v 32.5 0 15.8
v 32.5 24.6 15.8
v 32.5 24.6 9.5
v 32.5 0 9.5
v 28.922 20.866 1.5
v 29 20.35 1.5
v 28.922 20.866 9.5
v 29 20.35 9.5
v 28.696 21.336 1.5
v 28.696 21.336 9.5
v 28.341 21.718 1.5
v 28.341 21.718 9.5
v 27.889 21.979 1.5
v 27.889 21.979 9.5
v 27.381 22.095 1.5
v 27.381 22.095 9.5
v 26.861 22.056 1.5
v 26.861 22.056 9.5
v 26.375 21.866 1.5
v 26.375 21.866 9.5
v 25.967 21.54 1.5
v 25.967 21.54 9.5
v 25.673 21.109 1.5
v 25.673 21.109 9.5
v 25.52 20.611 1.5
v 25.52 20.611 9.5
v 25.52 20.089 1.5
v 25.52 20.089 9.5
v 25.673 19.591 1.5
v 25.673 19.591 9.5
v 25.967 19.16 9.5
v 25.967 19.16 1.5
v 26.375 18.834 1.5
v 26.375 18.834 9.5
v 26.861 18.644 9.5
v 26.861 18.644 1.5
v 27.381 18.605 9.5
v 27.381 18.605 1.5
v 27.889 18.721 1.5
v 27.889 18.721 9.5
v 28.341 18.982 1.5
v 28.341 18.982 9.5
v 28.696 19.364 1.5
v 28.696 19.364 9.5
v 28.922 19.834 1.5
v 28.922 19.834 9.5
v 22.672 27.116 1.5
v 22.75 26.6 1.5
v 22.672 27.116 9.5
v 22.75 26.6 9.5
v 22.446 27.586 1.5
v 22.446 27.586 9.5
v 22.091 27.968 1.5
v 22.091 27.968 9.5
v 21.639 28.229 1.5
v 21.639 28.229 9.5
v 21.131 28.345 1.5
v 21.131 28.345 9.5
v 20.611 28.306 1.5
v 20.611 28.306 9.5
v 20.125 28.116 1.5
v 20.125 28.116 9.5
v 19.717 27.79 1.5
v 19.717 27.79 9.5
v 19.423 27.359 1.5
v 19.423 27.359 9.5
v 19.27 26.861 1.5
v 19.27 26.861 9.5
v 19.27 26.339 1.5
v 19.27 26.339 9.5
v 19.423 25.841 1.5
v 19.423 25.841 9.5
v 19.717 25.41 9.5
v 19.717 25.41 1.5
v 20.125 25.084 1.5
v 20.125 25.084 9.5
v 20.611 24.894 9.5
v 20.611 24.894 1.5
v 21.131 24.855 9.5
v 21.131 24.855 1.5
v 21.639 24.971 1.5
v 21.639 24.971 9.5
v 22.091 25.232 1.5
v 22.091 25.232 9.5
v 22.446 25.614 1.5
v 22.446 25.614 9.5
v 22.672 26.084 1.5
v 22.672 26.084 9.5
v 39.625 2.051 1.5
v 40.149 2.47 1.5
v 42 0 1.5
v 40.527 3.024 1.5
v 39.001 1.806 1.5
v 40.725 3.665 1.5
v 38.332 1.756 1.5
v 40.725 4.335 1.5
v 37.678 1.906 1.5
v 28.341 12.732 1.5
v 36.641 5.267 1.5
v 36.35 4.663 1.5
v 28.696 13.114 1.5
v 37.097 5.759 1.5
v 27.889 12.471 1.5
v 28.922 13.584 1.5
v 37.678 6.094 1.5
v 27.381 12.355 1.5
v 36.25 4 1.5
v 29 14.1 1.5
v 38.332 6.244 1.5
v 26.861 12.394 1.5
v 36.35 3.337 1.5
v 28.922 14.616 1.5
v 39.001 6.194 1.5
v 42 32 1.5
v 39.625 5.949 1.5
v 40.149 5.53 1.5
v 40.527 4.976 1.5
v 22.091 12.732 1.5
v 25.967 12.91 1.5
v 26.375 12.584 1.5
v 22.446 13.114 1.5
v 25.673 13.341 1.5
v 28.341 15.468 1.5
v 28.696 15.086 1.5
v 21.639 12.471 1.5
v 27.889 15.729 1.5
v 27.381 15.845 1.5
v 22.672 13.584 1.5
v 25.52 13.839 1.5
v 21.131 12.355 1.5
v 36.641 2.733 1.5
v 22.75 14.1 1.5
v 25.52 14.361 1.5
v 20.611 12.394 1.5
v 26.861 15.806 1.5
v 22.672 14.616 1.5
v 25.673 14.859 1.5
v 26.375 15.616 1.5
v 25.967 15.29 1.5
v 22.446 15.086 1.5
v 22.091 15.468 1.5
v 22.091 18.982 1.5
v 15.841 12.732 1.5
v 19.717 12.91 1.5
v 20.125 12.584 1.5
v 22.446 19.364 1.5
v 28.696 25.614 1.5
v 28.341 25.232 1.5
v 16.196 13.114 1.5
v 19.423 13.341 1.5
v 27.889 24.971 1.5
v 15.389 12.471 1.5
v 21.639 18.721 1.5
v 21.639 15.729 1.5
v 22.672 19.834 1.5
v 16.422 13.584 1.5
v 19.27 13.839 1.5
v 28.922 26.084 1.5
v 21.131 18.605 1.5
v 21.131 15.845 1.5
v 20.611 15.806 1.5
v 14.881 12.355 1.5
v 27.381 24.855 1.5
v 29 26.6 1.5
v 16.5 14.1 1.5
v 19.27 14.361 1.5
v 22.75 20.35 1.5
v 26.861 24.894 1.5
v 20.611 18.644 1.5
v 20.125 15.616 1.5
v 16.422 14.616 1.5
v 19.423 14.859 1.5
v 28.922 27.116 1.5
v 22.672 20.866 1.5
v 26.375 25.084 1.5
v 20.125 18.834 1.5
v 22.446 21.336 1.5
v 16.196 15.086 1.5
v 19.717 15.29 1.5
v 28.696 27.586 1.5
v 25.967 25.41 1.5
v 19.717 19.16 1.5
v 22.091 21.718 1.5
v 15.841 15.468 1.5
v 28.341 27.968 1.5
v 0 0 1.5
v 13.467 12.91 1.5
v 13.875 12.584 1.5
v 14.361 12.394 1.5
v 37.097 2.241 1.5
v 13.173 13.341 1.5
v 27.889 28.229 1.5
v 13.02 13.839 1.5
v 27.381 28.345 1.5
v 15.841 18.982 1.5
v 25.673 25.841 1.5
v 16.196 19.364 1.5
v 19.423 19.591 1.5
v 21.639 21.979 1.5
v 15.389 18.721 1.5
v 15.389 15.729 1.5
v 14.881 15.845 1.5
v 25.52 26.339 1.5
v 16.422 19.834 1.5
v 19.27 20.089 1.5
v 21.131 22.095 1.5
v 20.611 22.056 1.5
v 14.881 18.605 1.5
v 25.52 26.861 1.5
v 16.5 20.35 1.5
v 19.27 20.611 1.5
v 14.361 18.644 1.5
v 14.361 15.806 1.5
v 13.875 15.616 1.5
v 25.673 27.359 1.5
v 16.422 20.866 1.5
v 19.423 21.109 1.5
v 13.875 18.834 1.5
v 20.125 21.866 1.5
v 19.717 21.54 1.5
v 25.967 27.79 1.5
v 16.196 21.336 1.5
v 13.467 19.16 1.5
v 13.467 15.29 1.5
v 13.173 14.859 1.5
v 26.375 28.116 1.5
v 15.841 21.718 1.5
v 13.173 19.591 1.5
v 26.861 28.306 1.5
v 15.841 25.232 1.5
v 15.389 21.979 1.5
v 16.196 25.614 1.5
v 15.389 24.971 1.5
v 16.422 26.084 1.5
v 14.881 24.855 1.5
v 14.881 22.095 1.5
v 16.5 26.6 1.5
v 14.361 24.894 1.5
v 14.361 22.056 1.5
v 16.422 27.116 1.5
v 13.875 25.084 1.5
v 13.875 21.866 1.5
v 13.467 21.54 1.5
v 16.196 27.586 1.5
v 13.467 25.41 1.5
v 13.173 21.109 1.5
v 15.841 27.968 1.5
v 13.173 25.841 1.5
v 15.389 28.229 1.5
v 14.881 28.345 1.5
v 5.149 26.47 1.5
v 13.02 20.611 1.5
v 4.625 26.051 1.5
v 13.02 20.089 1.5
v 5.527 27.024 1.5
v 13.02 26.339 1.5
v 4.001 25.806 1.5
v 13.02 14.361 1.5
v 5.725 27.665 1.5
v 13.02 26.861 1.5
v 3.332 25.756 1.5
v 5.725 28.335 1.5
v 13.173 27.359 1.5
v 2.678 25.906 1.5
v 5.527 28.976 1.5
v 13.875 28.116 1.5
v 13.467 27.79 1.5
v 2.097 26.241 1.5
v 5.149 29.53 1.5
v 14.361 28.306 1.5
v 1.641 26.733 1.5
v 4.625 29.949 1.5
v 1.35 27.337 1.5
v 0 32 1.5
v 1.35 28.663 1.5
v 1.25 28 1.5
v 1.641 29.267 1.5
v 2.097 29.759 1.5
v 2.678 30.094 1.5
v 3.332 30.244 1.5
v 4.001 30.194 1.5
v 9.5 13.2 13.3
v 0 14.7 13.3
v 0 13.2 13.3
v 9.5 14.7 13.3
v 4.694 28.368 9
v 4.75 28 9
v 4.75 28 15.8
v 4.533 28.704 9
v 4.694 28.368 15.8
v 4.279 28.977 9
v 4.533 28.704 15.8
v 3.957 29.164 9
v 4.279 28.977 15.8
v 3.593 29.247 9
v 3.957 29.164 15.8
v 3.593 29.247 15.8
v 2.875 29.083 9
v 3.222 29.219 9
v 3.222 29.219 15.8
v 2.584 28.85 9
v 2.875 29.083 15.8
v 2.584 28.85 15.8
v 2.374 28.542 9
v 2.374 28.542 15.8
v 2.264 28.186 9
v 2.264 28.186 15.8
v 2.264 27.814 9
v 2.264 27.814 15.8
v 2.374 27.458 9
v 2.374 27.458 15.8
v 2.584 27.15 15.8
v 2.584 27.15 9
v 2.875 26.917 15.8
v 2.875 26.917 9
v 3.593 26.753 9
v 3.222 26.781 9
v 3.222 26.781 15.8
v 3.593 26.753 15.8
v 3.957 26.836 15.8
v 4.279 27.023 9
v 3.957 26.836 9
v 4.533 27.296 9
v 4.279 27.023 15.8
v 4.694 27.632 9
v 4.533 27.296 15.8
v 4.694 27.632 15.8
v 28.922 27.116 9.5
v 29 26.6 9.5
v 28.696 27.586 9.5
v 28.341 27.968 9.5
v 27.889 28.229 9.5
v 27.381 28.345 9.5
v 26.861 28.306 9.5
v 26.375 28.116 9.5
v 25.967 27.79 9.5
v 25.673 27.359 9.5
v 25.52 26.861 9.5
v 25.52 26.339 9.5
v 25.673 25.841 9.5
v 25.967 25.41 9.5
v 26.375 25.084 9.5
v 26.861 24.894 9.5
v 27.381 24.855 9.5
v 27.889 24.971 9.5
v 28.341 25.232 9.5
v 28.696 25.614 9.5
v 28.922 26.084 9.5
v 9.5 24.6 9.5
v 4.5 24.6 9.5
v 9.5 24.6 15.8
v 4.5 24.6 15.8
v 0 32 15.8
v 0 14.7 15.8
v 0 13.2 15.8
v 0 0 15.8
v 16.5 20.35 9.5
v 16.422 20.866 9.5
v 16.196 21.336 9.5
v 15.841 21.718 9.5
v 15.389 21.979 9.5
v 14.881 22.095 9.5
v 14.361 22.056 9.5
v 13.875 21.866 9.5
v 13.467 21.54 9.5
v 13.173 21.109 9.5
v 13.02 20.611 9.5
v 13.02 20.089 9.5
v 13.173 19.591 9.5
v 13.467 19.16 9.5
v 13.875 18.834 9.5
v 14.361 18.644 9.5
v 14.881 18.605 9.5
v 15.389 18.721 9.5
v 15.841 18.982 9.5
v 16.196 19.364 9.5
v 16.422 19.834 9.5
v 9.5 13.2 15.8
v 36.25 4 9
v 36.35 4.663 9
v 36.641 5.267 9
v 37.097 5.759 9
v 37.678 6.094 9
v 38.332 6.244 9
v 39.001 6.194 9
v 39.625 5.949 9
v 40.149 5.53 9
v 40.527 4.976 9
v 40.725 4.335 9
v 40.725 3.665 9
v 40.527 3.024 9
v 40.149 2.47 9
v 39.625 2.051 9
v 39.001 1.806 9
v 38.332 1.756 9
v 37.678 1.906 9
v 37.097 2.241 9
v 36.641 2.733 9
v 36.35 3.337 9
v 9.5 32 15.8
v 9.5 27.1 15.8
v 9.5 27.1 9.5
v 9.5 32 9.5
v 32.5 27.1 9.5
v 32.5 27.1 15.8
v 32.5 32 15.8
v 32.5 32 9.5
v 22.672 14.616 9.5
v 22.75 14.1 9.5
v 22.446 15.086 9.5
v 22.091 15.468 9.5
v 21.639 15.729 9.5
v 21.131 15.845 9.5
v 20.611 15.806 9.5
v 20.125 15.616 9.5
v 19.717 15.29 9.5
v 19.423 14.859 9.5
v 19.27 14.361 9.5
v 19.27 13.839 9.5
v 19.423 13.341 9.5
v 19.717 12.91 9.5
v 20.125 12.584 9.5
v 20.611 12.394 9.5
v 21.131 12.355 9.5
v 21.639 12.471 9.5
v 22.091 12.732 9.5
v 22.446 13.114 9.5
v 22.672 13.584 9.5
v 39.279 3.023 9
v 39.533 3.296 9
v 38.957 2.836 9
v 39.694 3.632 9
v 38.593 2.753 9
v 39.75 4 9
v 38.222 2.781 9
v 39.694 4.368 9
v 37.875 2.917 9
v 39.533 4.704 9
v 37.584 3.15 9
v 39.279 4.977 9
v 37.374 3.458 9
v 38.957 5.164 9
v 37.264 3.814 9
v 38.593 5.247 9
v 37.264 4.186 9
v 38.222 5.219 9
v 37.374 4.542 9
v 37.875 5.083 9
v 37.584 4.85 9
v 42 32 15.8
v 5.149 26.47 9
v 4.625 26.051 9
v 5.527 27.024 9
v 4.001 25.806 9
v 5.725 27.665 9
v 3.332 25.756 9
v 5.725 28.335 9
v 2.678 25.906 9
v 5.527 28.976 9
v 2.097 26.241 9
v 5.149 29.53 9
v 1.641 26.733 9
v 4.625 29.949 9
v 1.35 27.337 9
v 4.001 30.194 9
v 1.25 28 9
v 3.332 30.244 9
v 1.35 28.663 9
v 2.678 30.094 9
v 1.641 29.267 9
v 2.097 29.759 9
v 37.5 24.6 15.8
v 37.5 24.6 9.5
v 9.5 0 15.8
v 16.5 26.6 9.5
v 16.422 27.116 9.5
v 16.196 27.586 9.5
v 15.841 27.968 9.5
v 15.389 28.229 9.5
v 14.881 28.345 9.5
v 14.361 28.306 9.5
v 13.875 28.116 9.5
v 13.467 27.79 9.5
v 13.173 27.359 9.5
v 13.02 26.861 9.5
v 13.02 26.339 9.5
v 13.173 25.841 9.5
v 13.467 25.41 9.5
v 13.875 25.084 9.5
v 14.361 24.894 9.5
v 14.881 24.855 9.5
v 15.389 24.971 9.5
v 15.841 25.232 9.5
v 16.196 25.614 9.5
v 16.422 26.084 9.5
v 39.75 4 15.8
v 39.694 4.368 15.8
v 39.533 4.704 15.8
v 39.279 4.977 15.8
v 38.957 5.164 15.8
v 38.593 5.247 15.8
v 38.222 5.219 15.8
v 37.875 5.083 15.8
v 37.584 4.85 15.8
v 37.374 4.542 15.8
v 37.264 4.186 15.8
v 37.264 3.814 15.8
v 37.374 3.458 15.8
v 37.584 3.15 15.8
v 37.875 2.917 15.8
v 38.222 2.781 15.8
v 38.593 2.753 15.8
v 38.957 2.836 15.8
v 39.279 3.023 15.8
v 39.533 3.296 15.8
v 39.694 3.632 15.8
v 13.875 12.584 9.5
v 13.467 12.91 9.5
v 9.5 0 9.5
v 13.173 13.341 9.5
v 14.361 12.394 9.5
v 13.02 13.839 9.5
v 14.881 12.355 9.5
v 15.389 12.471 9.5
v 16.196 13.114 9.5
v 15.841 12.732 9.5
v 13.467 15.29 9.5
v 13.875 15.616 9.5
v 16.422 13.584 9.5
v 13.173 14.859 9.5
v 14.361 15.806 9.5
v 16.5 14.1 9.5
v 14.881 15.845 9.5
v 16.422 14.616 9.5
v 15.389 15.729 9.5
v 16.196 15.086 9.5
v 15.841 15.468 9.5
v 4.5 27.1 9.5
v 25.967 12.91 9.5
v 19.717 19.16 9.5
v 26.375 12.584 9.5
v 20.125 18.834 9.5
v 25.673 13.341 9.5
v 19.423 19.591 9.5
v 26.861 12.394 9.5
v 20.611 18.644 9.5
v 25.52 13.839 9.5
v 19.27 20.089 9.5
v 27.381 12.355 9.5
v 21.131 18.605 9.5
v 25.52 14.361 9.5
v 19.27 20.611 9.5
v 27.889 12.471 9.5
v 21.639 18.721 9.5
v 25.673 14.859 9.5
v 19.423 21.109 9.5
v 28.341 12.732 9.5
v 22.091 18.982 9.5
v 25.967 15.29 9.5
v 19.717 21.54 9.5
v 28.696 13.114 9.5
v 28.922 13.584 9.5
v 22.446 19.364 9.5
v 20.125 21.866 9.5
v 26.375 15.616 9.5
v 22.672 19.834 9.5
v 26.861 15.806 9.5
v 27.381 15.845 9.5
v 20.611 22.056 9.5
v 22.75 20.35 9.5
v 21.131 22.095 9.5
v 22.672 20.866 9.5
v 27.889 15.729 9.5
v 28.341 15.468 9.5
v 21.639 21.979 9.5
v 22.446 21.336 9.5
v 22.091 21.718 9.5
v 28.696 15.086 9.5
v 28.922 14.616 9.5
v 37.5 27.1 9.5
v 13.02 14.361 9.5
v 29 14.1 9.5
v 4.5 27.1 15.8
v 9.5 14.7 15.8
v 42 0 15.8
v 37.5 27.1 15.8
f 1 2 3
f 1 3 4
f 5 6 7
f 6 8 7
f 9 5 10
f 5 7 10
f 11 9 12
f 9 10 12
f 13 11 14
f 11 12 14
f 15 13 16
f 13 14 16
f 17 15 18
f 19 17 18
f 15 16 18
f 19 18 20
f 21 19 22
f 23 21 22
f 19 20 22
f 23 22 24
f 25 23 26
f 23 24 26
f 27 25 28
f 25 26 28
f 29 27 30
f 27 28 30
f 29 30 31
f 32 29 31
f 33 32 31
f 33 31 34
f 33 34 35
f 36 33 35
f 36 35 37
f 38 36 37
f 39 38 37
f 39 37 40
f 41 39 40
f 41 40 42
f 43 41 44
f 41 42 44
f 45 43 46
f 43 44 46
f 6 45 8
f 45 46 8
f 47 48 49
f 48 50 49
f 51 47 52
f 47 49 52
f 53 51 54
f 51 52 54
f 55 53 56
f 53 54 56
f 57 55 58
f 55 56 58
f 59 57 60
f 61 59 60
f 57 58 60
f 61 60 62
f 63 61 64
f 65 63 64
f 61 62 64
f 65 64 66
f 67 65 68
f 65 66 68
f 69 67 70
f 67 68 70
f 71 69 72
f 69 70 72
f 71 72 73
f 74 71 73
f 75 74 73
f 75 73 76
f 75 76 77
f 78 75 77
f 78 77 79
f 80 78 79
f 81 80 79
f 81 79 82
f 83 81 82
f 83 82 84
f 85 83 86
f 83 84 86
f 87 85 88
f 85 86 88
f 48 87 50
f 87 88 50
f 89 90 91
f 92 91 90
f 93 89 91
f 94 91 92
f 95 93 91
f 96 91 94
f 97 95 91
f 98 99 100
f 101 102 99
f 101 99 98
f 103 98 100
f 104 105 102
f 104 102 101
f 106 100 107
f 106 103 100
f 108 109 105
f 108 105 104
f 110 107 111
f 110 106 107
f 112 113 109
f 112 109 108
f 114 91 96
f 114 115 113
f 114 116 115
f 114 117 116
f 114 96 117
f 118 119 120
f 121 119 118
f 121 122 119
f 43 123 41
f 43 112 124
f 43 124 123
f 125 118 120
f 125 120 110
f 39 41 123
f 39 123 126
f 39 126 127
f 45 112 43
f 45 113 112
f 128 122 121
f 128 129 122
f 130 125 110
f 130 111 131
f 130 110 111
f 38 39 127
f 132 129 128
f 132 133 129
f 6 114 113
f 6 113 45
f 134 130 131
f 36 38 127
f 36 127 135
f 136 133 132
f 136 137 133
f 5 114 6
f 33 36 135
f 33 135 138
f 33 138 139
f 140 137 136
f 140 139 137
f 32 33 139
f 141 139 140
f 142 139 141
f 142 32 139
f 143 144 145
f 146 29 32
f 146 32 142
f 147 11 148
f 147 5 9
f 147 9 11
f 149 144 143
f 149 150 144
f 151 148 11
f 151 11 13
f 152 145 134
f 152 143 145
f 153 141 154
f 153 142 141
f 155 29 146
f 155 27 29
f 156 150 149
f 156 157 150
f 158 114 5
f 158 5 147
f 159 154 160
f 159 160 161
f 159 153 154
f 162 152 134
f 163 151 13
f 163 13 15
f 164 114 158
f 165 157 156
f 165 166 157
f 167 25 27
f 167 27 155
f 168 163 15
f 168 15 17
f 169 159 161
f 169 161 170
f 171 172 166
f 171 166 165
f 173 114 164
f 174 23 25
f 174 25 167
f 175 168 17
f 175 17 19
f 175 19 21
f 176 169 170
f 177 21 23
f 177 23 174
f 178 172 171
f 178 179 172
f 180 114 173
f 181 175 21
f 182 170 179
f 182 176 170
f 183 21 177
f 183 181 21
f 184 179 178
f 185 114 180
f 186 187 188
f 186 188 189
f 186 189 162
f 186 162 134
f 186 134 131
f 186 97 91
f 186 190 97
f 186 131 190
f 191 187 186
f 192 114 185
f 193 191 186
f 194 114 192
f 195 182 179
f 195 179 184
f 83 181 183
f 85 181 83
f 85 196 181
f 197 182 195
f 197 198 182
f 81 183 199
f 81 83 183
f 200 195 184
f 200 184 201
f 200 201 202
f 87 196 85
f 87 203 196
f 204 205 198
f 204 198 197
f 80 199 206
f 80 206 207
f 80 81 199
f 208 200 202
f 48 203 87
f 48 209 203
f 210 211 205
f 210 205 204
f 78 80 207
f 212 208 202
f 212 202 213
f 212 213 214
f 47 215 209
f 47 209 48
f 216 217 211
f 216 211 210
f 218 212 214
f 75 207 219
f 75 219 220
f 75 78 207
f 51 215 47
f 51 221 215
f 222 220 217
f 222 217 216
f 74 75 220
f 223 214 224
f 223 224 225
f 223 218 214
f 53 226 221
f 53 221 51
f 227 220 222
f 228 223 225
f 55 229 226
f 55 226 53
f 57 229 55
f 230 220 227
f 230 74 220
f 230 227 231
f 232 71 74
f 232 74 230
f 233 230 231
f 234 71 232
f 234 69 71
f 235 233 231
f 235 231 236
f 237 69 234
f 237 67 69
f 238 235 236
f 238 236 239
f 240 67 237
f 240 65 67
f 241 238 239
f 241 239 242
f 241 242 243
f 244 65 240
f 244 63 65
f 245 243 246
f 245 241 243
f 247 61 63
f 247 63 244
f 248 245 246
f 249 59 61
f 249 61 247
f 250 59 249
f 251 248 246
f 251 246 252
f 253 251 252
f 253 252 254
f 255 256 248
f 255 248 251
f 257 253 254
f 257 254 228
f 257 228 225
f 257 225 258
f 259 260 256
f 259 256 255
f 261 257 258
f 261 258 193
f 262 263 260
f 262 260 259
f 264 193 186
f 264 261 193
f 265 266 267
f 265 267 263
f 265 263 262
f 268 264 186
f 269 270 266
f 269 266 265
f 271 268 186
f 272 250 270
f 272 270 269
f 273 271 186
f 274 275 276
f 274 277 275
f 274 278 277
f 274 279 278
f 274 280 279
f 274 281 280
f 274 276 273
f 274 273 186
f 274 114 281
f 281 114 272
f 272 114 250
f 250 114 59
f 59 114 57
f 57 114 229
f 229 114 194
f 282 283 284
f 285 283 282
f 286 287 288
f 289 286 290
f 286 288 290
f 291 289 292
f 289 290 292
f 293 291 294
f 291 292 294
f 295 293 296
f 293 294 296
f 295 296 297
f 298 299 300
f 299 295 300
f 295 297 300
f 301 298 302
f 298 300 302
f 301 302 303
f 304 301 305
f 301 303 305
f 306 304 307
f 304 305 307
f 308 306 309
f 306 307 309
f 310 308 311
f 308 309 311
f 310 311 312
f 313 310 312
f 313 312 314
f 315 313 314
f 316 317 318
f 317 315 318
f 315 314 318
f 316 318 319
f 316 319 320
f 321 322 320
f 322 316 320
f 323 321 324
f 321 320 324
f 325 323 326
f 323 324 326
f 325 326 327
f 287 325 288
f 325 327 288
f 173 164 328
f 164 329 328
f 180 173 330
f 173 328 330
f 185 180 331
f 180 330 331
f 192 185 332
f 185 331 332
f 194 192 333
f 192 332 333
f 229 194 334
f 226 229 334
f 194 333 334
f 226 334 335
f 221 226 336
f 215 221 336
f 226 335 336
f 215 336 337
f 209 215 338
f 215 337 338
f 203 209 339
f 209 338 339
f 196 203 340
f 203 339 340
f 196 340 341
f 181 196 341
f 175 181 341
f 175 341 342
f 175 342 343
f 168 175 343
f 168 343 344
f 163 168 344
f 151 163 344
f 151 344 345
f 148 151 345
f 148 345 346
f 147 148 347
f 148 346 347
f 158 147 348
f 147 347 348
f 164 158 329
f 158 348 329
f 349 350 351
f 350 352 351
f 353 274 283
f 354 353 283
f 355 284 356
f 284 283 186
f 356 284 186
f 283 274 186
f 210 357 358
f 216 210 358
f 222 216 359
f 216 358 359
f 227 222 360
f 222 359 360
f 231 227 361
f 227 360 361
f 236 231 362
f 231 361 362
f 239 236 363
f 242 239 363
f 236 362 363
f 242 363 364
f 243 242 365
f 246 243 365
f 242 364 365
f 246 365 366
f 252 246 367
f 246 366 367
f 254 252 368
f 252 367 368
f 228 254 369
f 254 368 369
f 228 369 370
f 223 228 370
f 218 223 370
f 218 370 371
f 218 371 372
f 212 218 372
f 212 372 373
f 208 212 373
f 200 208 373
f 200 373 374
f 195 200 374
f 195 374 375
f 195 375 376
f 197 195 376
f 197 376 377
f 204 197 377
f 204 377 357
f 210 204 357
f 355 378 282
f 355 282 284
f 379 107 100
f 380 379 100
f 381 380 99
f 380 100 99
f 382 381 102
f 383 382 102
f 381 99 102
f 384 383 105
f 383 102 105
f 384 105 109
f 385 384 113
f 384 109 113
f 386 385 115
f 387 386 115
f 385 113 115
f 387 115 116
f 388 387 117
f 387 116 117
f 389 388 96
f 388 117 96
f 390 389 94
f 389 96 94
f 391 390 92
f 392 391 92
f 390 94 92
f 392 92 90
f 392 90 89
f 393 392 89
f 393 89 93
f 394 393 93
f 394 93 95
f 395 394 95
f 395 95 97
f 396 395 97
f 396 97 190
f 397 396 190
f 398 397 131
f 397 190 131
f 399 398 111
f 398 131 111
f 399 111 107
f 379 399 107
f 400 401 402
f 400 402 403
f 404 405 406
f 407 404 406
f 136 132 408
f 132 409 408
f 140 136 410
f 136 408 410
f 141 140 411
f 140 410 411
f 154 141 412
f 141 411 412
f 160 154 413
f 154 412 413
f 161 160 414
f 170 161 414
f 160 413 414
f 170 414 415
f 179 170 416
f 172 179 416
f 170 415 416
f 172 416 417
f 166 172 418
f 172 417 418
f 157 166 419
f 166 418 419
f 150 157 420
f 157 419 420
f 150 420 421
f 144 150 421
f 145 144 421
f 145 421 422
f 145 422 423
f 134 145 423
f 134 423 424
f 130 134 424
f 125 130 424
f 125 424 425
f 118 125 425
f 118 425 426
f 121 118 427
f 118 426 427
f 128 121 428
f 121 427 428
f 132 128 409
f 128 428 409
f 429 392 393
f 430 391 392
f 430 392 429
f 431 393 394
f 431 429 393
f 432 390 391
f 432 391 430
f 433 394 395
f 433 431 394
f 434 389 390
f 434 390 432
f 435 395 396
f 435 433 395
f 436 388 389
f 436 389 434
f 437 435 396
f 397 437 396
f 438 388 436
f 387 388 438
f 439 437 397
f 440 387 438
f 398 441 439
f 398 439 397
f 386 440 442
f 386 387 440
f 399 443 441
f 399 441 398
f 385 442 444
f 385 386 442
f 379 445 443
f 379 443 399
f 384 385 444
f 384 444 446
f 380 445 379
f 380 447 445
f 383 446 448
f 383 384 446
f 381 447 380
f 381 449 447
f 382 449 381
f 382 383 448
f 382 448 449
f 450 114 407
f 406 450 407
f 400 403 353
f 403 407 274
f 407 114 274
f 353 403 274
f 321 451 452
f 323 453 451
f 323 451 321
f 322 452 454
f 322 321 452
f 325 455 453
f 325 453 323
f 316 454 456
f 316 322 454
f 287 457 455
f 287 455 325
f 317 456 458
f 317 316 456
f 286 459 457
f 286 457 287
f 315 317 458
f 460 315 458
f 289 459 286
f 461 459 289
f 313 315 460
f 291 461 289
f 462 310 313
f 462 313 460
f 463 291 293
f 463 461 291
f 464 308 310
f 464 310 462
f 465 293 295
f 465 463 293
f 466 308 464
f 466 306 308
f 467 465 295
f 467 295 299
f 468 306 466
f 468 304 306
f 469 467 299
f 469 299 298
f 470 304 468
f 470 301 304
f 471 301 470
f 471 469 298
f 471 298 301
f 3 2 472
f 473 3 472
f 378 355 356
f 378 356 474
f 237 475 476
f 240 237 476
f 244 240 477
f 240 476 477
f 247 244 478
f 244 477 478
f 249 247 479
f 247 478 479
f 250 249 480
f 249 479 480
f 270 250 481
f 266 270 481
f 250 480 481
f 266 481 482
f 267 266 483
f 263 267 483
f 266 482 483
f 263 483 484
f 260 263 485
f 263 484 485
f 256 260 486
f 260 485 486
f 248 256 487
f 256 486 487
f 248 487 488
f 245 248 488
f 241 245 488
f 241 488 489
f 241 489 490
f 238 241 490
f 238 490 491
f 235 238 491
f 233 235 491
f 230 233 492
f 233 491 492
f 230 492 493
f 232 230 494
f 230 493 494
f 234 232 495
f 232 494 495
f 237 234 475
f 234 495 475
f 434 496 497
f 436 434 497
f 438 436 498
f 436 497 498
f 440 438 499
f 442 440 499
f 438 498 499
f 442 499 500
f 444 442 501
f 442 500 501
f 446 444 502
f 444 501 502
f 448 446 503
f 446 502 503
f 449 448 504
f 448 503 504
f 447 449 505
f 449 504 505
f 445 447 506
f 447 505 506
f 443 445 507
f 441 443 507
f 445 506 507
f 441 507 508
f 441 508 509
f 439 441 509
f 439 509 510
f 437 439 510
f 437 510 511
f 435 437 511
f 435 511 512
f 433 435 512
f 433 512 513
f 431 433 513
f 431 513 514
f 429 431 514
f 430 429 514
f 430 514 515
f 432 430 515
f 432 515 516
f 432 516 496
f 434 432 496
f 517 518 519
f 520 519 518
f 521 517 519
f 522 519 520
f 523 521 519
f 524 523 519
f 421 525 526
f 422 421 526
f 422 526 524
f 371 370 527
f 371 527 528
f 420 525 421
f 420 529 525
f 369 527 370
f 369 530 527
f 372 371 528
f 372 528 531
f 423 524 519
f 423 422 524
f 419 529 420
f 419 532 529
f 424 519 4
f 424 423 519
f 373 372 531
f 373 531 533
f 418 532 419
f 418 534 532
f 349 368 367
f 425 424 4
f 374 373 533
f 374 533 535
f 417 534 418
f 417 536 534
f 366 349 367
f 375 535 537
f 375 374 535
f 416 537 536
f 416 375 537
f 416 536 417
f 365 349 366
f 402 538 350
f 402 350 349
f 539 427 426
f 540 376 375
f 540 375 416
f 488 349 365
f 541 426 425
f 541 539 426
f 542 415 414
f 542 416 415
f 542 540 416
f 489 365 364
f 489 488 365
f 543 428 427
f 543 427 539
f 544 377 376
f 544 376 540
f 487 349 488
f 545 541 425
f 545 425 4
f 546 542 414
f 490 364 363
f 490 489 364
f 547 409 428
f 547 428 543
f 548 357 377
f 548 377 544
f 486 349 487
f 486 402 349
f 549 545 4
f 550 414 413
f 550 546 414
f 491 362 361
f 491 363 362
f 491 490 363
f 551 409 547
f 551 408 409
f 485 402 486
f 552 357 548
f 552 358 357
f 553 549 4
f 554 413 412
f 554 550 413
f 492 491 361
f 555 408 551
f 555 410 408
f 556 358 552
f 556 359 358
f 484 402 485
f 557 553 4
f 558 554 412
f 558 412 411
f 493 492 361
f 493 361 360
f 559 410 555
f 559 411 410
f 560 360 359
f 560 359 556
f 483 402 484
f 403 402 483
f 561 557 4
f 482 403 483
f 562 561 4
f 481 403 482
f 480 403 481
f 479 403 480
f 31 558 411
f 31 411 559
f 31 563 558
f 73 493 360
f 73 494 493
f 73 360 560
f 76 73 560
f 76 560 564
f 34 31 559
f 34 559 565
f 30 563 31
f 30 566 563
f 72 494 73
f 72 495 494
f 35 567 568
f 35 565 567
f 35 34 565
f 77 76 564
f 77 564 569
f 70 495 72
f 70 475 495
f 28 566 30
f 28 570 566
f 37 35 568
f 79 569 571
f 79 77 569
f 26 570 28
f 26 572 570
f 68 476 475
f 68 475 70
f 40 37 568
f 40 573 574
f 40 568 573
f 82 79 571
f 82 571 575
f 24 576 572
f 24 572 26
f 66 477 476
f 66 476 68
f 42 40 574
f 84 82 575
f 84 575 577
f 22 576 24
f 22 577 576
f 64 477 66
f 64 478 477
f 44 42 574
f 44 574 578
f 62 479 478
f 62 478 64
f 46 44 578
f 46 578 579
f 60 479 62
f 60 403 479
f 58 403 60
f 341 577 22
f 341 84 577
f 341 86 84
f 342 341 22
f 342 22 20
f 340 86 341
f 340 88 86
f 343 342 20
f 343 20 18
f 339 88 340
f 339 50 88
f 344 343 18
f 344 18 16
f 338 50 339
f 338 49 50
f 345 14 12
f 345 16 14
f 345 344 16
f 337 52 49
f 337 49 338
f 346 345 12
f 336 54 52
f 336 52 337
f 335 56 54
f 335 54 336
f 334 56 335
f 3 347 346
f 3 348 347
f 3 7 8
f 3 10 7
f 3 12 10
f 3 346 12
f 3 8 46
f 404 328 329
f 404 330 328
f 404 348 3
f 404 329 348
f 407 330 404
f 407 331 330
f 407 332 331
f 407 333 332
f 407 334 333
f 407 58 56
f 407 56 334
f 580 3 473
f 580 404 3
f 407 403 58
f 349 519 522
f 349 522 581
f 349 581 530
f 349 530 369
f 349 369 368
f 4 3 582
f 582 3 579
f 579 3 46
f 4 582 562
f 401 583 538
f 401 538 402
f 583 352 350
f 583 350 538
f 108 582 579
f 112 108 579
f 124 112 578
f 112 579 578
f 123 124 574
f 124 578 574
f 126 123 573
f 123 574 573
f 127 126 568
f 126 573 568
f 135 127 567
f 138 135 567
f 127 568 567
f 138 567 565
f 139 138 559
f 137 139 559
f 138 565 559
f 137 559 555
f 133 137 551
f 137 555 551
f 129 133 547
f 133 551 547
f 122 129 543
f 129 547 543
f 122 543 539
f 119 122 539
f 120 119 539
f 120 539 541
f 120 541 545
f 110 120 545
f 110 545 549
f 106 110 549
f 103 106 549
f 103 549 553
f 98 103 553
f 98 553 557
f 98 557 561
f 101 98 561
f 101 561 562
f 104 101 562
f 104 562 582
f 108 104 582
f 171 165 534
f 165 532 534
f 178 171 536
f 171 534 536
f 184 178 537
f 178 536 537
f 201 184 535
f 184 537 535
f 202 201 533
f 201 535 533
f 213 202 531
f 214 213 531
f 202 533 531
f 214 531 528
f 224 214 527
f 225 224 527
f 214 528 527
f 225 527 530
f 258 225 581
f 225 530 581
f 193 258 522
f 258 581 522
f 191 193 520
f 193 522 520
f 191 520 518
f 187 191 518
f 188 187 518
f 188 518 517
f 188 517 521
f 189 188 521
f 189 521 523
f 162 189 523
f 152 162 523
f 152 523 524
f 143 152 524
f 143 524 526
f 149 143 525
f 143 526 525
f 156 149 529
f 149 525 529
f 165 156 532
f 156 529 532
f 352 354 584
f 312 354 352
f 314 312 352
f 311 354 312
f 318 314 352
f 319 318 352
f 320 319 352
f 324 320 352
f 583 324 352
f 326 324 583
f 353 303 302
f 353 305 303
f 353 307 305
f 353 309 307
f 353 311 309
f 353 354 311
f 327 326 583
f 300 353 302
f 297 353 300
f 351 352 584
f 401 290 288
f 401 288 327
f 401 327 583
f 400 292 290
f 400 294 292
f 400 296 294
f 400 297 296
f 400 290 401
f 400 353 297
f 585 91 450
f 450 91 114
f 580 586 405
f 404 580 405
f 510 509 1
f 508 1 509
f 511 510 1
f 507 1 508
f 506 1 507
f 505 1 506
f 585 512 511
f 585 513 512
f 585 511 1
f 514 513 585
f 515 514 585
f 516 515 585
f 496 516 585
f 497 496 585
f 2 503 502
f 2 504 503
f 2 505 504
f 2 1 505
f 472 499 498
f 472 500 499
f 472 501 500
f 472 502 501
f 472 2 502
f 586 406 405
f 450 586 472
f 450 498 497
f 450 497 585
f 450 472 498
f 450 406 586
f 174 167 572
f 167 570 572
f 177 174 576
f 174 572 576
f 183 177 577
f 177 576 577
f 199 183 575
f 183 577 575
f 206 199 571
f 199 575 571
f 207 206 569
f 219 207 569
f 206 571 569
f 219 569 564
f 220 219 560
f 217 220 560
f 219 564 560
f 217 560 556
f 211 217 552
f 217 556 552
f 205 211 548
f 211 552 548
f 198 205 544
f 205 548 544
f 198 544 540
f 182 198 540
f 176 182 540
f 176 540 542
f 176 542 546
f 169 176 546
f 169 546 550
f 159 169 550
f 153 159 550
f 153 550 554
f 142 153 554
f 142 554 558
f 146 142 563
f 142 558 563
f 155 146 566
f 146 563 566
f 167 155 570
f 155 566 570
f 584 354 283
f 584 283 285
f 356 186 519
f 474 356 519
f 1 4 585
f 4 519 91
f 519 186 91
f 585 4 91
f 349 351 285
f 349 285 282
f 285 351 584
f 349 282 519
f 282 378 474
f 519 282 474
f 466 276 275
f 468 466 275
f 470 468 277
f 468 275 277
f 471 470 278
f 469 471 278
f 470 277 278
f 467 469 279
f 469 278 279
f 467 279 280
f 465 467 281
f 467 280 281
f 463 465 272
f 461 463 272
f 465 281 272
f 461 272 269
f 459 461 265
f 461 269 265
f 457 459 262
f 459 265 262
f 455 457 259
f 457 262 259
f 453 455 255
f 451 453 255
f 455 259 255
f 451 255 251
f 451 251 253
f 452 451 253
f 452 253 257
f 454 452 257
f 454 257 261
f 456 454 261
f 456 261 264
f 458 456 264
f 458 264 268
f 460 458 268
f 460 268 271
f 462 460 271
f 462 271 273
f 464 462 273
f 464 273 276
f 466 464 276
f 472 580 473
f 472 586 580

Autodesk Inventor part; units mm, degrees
ref_plane "YZ Plane" through (0, 0, 0) normal (1, 0, 0) x (0, 1, 0)
ref_plane "XZ Plane" through (0, 0, 0) normal (0, 1, 0) x (-1, 0, 0)
ref_plane "XY Plane" through (0, 0, 0) normal (0, 0, 1) x (1, 0, 0)
sketch "Sketch2" plane through (0, 0, 0) normal (0, 0, 1) x (1, 0, 0)
  line L0 (0, 0) -> (42, 0)
  line L1 (42, 0) -> (42, 32)
  line L2 (42, 32) -> (0, 32)
  line L3 (0, 32) -> (0, 0)
  dimension "d0" = 42
  dimension "d1" = 32
extrude "Cover_Body" add sketch "Sketch2" along normal blind 15.8
sketch "Sketch4" plane through (0, 0, 15.8) normal (0, 0, 1) x (1, 0, 0)
  line L0 (42, 32) -> (0, 32) projected
  line L1 (0, 32) -> (0, 0) projected
  line L2 (4.5, 24.6) -> (9.5, 24.6)
  line L3 (32.5, 24.6) -> (37.5, 24.6)
  line L4 (42, 0) -> (42, 32) projected
  line L5 (0, 0) -> (42, 0) projected
  line L6 (4.5, 24.6) -> (4.5, 27.1)
  line L7 (4.5, 27.1) -> (9.5, 27.1)
  line L8 (9.5, 27.1) -> (9.5, 32)
  line L9 (37.5, 27.1) -> (37.5, 24.6)
  line L10 (37.5, 27.1) -> (32.5, 27.1)
  line L11 (32.5, 27.1) -> (32.5, 32)
  line L12 (9.5, 32) -> (32.5, 32)
  line L13 (21, 36.5125) -> (21, -47.625) construction
  line L14 (32.5, 24.6) -> (32.5, 0)
  line L15 (9.5, 24.6) -> (9.5, 0)
  line L16 (9.5, 0) -> (32.5, 0)
  point P0 (4.9935, 32)
  point P1 (37, 32)
  dimension "d6" = 5
  dimension "d14" = 2.5
  dimension "d15" = 2.5
  dimension "d22" = 42
  dimension "d23" = 21
  dimension "d24" = 23
  dimension "d28" = 5
  dimension "d118" = 23
  dimension "d119" = 11.5
  dimension "d120" = 11.5
  dimension "d121" = 24.6
extrude "Servo_Opening" cut sketch "Sketch4" against normal blind 6.3 contours L11 L10 L9 L3 L14 L5 L15 L2 L6 L7 L8 L0
sketch "Sketch5" plane through (0, 0, 15.8) normal (0, 0, 1) x (1, 0, 0)
  line L0 (0, 32) -> (0, 0) projected
  line L1 (0, 13.2) -> (0, 14.7)
  line L2 (-29.647, 13.95) -> (54.8226, 13.95) construction
  line L3 (0, 0) -> (42, 0) projected
  line L4 (0, 14.7) -> (9.5, 14.7)
  line L5 (9.5, 14.7) -> (9.5, 13.2)
  line L6 (9.5, 13.2) -> (0, 13.2)
  line L7 (9.5, 0) -> (9.5, 24.6) projected
  line L8 (9.5, 32) -> (0, 32) projected
  dimension "d97" = 1.5
  dimension "d131" = 13.2
extrude "Cable_Opening" cut sketch "Sketch5" against normal blind 2.5 contours L4 L5 L6 L0
sketch "Sketch6" plane through (0, 0, 15.8) normal (0, 0, 1) x (1, 0, 0)
  circle A0 centre (3.5, 28) radius 1.25
  circle A1 centre (38.5, 28) radius 1.25 construction
  circle A2 centre (38.5, 4) radius 1.25
  circle A3 centre (3.5, 4) radius 1.25 construction
  line L0 (21, 34.35) -> (21, -13.275) construction
  line L1 (-20.6375, 16) -> (66.675, 16) construction
  line L2 (42, 0) -> (42, 32) projected
  line L3 (0, 32) -> (0, 0) projected
  line L4 (9.5, 32) -> (0, 32) projected
  line L5 (0, 0) -> (42, 0) projected
  point P0 (42, 12.35)
  point P1 (0, 12.35)
  dimension "d29" = 2.5
  dimension "d30" = 2.5
  dimension "d31" = 2.5
  dimension "d32" = 2.5
  dimension "d33" = 42
  dimension "d34" = 21
  dimension "d35" = 32
  dimension "d36" = 16
  dimension "d37" = 35
  dimension "d38" = 17.5
  dimension "d39" = 24
  dimension "d40" = 12
extrude "Holes_Mounting_Screws" cut sketch "Sketch6" against normal up to surface (15.8 mm away)
sketch "Sketch16" plane through (0, 0, 0) normal (0, 0, -1) x (-1, 0, 0)
  circle A0 centre (-38.5, 4) radius 2.25
  circle A1 centre (-3.5, 28) radius 2.25
  circle A2 centre (-38.5, 4) radius 1.25 projected
  circle A3 centre (-3.5, 28) radius 1.25 projected
  dimension "d99" = 4.5
  dimension "d100" = 4.5
extrude "Pocket_Mounting_Screws" cut sketch "Sketch16" against normal blind 9
sketch "Sketch17" plane through (0, 0, 9.5) normal (0, 0, 1) x (1, 0, 0)
  circle A0 centre (14.75, 26.6) radius 1.75
  line L0 (9.5, 32) -> (32.5, 32) projected
  line L1 (9.5, 27.1) -> (9.5, 32) projected
  point P0 (0, 0)
  dimension "d105" = 3.5
  dimension "d106" = 5.4
  dimension "d107" = 5.25
extrude "Heat_Dissipation_Hole" cut sketch "Sketch17" against normal up to surface (9.5 mm away)
pattern_linear "Pattern_Heat_Dissipation_Hole" count 3 spacing 6.25 along (1, 0, 0) count 3 spacing 6.25 along (0, -1, 0) of "Heat_Dissipation_Hole"
sketch "Sketch25" plane through (0, 0, 0) normal (0, 0, -1) x (-1, 0, 0)
  line L0 (0, 32) -> (0, 0) projected
  line L1 (-42, 32) -> (-32.5, 32) projected
  line L2 (0, 0) -> (-42, 0)
  line L3 (-42, 0) -> (-42, 32)
  line L4 (-42, 32) -> (0, 32)
  line L5 (0, 32) -> (0, 0)
extrude "Material_Reduction_Optional" cut sketch "Sketch25" against normal blind 1.5
equation "\"d15\" = d14"
equation "\"d23\" = 0.5 * d22"
equation "\"d28\" = d6"
equation "\"d120\" = 0.5 * d118"
equation "\"d34\" = 0.5 * d33"
equation "\"d36\" = 0.5 * d35"
equation "\"d38\" = 0.5 * d37"
equation "\"d40\" = 0.5 * d39"
equation "\"d99\" = d101"
equation "\"d100\" = d101"
equation "\"d101\" = 4.5"
properties part number "EDMO1-0_Cover" material "PLA"
